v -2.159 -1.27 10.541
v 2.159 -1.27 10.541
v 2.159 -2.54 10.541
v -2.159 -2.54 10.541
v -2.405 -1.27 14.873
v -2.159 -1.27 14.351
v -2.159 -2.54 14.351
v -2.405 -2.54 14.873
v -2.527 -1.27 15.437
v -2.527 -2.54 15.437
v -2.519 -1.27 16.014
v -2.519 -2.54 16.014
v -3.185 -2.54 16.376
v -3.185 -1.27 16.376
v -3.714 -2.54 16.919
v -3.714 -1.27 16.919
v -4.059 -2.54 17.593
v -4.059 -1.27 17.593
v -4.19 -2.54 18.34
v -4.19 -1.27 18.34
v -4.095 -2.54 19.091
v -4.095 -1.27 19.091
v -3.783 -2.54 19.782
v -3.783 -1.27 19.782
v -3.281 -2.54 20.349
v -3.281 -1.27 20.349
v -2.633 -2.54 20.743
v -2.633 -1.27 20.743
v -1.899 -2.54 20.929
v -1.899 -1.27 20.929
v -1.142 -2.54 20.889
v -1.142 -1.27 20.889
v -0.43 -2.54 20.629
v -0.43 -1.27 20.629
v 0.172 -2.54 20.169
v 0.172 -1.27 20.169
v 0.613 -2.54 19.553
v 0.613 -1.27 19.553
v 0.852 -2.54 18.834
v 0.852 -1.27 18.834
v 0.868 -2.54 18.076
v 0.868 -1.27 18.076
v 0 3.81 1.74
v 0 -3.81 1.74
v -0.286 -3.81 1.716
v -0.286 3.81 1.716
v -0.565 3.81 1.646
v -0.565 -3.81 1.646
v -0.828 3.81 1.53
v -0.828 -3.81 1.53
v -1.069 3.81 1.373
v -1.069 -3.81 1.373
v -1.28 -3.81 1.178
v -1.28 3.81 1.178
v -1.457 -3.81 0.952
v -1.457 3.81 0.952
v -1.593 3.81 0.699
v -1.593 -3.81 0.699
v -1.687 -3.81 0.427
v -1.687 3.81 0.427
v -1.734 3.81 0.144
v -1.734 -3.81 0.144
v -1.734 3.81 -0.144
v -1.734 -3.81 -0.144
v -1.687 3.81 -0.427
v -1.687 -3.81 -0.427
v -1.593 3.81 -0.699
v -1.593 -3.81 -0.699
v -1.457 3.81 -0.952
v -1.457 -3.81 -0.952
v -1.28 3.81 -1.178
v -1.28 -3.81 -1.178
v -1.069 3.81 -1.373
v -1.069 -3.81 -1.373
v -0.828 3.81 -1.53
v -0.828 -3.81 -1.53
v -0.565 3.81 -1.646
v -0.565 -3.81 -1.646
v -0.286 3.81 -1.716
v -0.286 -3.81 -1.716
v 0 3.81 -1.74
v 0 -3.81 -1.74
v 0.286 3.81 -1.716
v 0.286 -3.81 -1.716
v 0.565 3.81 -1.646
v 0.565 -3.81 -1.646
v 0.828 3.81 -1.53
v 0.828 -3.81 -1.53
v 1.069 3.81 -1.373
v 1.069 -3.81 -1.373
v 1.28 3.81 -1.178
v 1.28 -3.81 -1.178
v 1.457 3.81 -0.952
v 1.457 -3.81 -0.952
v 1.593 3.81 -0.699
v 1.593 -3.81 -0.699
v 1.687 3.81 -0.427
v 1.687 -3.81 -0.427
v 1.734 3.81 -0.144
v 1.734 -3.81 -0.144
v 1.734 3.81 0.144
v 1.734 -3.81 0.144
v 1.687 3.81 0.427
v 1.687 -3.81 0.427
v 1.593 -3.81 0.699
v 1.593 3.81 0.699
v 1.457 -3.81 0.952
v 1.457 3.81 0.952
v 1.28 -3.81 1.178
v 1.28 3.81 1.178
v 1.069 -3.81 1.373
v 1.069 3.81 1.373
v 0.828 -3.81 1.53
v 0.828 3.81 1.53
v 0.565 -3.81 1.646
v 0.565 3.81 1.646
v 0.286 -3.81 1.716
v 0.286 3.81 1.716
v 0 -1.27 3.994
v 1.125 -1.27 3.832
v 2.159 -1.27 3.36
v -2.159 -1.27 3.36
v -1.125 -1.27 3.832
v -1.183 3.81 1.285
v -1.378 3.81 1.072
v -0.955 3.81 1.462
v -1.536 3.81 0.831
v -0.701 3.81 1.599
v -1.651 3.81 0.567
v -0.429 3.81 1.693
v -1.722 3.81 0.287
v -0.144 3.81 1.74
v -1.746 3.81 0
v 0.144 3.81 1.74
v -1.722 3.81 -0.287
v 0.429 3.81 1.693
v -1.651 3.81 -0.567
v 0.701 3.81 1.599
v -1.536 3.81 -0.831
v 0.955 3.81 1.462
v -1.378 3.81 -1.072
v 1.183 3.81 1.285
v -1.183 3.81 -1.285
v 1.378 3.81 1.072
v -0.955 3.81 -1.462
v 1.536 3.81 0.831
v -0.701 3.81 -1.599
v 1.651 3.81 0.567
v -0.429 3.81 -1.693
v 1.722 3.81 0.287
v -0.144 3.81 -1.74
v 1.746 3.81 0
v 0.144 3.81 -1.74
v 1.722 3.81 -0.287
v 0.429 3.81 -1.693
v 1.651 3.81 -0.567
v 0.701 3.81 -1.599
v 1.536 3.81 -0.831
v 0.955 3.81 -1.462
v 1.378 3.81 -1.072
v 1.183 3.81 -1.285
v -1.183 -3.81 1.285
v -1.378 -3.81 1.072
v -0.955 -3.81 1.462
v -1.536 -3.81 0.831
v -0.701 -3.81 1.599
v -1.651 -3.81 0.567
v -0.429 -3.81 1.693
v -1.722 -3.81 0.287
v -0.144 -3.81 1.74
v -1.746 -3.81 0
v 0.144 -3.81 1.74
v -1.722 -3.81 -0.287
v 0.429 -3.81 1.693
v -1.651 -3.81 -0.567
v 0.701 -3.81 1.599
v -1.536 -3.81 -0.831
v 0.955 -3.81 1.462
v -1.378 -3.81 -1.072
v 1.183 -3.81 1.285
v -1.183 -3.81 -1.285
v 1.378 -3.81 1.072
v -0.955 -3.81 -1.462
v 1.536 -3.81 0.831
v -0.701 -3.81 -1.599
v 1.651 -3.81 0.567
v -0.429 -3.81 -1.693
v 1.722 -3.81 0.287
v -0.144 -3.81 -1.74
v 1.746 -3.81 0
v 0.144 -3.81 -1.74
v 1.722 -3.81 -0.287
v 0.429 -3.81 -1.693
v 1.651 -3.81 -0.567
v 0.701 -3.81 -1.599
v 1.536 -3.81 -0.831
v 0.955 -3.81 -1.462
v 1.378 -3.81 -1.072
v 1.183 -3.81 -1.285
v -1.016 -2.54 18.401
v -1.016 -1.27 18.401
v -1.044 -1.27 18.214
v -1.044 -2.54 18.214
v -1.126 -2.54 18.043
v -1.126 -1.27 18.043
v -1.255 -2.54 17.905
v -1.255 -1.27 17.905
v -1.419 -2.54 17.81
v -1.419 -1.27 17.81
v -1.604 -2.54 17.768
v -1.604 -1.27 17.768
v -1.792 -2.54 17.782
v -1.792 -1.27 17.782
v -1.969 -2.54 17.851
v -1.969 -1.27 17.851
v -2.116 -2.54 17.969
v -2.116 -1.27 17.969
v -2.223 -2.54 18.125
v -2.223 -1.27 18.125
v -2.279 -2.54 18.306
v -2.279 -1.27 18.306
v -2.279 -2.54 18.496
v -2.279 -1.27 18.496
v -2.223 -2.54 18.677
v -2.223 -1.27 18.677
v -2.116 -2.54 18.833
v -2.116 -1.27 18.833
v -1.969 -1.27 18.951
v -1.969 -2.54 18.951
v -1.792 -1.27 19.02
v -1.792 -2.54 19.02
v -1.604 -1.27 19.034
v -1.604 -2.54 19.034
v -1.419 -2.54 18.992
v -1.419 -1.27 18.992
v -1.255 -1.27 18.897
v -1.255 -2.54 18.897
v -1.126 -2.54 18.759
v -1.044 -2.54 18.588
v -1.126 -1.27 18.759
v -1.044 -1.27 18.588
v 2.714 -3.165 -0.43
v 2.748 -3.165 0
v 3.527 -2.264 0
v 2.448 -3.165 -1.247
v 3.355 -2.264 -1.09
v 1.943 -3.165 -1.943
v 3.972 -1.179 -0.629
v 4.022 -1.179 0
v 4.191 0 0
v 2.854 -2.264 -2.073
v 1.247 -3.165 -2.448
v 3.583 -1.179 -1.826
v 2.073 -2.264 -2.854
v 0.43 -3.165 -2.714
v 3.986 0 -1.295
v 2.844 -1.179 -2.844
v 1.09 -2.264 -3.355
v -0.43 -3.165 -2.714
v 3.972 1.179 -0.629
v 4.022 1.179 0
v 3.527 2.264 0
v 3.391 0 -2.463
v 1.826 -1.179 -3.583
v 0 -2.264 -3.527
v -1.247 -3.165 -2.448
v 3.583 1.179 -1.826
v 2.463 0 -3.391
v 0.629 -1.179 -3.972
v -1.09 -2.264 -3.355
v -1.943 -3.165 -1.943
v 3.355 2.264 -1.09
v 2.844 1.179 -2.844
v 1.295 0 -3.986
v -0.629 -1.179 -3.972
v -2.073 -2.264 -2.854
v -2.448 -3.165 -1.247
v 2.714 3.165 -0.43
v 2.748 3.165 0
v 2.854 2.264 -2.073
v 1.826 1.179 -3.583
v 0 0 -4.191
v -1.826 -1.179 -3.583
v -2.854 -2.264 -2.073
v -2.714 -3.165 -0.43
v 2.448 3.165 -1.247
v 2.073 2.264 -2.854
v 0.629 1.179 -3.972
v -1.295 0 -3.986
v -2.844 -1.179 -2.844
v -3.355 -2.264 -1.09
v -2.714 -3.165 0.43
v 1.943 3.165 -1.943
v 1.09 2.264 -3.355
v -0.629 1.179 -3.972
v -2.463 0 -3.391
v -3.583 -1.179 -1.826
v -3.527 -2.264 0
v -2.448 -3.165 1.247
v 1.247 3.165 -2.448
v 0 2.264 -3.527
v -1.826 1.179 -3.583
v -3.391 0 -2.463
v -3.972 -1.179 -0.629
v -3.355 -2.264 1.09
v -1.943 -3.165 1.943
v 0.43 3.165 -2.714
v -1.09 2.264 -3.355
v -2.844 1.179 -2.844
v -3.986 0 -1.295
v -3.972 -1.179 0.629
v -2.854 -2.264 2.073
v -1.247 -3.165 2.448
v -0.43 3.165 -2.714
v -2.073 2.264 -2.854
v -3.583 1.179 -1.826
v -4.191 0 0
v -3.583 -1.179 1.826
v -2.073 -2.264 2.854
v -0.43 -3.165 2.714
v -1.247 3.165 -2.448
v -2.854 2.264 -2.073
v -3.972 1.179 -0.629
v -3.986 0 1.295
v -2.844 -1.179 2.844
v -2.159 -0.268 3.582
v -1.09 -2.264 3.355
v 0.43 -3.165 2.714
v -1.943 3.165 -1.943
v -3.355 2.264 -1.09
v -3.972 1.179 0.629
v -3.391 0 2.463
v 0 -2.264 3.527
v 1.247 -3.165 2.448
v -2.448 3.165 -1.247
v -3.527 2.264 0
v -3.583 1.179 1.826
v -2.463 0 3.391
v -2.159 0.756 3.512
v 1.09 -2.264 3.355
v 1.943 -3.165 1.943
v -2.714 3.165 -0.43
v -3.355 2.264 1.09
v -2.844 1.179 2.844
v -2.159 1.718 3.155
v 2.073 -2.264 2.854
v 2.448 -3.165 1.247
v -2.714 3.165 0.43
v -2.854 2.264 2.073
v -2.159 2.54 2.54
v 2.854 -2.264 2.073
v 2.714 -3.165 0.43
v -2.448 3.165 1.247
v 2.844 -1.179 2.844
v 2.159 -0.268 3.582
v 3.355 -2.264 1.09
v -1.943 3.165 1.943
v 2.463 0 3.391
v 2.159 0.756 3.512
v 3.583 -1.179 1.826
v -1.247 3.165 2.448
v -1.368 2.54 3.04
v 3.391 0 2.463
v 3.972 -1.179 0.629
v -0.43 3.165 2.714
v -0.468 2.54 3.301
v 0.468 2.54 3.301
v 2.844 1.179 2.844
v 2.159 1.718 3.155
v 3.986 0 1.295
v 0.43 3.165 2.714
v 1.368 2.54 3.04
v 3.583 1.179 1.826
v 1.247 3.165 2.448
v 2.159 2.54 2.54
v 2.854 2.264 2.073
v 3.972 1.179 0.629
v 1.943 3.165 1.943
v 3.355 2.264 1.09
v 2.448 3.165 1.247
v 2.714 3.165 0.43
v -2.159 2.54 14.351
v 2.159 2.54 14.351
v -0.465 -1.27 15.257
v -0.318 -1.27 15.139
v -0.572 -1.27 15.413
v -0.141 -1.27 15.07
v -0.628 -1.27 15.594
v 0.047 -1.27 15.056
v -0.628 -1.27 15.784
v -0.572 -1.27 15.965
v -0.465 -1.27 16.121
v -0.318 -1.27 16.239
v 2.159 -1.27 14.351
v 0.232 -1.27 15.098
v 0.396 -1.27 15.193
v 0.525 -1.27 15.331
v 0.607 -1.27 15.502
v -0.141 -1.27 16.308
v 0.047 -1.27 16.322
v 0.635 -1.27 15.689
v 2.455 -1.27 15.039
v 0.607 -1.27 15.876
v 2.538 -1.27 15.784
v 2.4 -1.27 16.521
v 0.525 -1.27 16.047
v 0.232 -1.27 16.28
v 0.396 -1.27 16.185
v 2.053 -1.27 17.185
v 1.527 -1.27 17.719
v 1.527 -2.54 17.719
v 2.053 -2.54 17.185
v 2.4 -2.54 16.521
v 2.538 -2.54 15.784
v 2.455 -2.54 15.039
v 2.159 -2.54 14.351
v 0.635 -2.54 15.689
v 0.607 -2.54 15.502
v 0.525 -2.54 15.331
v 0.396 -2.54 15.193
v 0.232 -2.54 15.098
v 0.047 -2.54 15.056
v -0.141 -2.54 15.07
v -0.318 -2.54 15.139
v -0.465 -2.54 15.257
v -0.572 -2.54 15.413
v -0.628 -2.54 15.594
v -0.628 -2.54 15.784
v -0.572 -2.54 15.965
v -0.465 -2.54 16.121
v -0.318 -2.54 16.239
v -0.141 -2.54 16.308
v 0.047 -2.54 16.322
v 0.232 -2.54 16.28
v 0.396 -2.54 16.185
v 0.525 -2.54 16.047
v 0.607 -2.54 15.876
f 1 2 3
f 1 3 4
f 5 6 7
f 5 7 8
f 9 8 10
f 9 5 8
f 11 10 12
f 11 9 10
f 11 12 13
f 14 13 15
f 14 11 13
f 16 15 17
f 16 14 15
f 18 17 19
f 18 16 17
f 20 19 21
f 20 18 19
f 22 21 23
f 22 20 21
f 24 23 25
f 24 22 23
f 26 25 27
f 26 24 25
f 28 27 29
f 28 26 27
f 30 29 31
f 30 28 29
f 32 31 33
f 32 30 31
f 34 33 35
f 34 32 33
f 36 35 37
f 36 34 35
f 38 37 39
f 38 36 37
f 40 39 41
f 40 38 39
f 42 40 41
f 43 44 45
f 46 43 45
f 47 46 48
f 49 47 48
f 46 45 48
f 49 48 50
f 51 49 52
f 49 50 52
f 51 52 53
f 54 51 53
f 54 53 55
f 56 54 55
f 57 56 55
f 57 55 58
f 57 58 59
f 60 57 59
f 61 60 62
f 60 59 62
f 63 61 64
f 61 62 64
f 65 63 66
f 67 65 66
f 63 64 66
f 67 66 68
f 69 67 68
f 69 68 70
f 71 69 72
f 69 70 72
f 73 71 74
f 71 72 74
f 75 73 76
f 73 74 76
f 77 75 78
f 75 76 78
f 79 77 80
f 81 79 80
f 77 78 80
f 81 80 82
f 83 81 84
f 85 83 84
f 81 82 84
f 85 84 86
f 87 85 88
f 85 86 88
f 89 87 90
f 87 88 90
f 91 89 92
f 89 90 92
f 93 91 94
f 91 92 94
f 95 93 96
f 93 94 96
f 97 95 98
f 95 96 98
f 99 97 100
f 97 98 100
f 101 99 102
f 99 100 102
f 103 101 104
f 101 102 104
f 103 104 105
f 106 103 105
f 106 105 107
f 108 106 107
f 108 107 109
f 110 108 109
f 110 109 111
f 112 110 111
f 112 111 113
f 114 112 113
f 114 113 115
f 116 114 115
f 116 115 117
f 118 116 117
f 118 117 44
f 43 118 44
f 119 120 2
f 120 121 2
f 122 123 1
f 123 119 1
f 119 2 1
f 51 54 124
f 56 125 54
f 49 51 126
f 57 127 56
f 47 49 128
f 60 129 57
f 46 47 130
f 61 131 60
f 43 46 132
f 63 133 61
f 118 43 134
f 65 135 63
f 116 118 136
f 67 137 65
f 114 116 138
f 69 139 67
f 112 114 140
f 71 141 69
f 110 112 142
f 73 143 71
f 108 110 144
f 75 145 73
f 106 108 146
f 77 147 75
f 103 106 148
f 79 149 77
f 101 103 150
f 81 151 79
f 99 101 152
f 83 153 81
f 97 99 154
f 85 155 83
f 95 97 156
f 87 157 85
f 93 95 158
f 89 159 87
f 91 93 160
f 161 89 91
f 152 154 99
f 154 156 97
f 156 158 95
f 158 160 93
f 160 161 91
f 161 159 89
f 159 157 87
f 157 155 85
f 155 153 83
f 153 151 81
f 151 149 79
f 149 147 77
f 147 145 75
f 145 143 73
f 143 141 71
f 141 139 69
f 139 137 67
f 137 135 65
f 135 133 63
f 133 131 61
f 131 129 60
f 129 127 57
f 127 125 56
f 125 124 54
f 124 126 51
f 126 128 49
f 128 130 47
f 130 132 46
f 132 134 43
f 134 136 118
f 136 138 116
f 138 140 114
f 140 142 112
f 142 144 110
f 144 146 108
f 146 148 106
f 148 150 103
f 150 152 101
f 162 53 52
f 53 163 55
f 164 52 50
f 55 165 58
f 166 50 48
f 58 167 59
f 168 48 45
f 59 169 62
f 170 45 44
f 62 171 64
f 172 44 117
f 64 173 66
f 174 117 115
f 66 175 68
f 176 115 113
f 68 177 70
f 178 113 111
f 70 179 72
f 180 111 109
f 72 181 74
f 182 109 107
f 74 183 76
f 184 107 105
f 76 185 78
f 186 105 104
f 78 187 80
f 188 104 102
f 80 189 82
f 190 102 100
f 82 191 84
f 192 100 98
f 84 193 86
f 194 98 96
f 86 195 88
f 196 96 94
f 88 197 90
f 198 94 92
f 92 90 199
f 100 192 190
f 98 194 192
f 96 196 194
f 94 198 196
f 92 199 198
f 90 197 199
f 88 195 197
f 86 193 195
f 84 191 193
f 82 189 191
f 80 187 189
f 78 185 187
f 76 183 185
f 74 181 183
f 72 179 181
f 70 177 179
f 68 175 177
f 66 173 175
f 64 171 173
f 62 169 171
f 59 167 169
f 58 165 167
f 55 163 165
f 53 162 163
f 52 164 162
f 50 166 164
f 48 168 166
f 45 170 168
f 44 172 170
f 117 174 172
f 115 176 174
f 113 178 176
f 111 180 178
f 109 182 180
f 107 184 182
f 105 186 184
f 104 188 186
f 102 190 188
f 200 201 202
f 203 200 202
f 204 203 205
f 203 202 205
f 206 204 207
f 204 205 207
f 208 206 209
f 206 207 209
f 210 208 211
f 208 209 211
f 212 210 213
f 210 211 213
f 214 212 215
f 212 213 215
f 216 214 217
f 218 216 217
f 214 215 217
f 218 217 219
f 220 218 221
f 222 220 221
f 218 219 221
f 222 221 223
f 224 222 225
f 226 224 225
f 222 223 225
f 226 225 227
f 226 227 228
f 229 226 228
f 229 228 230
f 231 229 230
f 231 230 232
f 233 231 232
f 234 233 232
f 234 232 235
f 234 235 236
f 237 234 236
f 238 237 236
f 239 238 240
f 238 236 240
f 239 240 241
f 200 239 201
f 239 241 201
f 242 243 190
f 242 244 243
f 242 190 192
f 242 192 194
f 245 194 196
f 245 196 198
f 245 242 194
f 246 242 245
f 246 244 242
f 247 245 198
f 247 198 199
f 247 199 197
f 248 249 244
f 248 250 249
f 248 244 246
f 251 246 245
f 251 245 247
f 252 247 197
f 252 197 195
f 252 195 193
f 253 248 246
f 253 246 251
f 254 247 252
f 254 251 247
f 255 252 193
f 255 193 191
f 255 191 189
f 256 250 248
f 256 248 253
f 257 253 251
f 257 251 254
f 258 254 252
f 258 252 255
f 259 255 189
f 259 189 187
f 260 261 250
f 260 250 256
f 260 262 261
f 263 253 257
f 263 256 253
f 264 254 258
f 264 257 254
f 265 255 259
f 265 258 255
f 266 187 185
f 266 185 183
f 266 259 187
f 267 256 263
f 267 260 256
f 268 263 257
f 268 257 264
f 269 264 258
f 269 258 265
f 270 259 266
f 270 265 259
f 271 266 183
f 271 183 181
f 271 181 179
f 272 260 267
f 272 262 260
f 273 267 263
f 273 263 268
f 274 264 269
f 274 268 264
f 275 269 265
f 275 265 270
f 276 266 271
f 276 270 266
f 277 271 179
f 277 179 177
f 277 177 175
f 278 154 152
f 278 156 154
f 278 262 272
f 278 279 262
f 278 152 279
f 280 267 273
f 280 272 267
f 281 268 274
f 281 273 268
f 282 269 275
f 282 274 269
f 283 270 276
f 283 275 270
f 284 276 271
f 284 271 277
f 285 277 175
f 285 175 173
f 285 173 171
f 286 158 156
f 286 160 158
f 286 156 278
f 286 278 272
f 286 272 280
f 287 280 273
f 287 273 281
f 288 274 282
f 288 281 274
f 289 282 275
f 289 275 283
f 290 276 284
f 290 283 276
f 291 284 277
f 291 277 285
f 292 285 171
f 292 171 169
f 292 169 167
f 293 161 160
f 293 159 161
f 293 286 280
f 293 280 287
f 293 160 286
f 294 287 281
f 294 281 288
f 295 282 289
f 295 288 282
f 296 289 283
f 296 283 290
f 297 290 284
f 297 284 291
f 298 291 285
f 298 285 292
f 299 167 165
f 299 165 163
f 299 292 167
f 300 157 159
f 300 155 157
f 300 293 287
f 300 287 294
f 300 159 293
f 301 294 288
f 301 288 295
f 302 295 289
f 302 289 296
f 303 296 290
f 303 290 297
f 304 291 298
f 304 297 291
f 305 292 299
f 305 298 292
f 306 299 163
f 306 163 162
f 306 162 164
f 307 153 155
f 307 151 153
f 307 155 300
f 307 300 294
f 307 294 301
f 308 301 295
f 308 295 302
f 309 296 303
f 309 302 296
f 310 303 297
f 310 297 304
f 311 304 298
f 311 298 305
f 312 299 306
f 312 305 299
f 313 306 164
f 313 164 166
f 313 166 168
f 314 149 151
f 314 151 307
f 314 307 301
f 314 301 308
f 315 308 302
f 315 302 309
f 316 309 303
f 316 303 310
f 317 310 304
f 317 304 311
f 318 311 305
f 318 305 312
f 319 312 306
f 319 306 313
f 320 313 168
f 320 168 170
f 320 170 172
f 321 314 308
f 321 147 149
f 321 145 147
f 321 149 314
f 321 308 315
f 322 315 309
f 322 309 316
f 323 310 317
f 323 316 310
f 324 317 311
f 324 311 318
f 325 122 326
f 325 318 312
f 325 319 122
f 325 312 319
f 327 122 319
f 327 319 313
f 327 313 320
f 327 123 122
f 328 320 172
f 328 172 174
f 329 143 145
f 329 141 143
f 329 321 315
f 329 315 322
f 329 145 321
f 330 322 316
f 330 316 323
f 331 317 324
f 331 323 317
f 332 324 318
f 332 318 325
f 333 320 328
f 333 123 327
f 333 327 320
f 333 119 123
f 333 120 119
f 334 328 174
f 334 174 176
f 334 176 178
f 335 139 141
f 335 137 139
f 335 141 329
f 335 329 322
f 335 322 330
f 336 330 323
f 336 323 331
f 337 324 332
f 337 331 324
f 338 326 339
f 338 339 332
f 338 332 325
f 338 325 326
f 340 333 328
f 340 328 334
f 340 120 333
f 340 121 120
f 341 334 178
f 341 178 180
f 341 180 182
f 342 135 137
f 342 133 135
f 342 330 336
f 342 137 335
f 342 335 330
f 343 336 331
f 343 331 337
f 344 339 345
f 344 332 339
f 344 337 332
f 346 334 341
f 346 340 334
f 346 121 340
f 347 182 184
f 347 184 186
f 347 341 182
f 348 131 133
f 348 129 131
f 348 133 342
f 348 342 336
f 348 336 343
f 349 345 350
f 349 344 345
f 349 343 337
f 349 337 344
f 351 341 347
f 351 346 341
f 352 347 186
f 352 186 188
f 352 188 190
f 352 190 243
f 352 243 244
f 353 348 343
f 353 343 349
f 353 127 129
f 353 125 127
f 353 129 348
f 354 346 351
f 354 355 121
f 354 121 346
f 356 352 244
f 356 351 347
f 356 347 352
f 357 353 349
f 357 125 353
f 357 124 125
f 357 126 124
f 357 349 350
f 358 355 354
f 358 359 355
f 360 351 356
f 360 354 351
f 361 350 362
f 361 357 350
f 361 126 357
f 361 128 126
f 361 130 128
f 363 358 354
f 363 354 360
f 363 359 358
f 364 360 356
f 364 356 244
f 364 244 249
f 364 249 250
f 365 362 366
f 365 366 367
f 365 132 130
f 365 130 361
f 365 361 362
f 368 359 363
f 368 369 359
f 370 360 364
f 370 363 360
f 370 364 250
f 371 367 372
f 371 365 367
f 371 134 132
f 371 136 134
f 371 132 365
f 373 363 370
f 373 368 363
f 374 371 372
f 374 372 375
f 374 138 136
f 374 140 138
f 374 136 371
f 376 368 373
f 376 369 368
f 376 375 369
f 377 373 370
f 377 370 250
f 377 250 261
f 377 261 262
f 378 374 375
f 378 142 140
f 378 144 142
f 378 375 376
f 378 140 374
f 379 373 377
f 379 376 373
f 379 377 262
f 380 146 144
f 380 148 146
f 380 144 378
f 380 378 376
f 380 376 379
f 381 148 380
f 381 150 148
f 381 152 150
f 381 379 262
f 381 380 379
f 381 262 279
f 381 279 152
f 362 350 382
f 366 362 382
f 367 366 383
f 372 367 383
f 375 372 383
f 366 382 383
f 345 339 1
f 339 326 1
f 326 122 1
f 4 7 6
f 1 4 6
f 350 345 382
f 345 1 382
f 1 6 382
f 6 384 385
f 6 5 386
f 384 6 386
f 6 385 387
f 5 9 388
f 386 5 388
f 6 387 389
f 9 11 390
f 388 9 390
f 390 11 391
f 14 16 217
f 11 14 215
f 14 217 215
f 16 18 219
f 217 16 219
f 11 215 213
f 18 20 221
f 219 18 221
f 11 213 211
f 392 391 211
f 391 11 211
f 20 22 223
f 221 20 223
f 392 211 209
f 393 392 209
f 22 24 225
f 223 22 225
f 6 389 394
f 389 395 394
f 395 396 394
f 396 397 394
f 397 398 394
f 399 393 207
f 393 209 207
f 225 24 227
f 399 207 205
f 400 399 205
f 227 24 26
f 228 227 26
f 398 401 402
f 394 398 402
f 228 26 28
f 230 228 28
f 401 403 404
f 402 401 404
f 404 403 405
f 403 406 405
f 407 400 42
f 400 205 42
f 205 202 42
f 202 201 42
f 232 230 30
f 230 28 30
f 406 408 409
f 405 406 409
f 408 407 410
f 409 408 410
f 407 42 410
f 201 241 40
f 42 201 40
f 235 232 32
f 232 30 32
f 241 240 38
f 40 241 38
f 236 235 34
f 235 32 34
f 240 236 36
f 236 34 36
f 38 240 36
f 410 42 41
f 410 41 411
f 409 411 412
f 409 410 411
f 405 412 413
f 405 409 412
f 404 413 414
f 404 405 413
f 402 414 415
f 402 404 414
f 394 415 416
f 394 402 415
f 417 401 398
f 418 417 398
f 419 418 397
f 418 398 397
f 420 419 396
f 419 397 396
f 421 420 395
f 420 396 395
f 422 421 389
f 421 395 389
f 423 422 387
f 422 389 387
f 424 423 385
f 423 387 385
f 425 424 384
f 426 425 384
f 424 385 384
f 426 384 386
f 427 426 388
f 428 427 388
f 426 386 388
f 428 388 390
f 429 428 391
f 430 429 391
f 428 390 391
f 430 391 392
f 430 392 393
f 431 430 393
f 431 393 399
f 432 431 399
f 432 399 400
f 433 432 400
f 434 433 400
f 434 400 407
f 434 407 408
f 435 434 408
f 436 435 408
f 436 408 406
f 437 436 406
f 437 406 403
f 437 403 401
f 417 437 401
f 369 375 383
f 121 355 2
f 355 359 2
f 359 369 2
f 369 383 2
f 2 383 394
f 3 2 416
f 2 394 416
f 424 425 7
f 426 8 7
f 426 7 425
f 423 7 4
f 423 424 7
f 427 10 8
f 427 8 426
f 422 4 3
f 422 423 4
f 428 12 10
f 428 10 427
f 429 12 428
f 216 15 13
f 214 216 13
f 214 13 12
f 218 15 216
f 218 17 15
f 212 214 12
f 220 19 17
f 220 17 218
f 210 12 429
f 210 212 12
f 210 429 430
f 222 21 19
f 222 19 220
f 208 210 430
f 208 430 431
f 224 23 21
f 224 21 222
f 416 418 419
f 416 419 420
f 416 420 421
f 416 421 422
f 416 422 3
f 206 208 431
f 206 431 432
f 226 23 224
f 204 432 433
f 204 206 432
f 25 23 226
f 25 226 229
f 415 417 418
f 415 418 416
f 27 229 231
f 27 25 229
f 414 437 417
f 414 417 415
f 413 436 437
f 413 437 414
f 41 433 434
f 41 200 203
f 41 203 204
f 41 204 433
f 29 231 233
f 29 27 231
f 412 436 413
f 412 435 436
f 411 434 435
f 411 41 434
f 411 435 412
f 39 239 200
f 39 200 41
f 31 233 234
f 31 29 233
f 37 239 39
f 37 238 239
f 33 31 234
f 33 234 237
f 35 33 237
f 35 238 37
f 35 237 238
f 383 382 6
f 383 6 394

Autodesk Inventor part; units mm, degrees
ref_plane "YZ Plane" through (0, 0, 0) normal (1, 0, 0) x (0, 1, 0)
ref_plane "XZ Plane" through (0, 0, 0) normal (0, 1, 0) x (-1, 0, 0)
sketch "Sketch1" plane through (0, 0, 0) normal (0, 0, 1) x (1, 0, 0)
  line L0 (0, 3.81) -> (1.746, 3.81)
  line L1 (0, 0) -> (0, 7.4896) construction
  line L2 (0, 0) -> (13.1944, 0) construction
  line L3 (0, -3.81) -> (1.746, -3.81)
  arc A0 (1.746, -3.81) -> (1.746, 3.81) centre (0, 0) ccw
  line L4 (0, 3.81) -> (0, -3.81)
  point P0 (-6.8886, 3.81)
  point P1 (6.6767, 3.81)
  point P2 (0, 4.191)
  point P3 (0, 4.191)
  point P4 (-6.8886, -3.81)
  point P5 (6.6767, -3.81)
  point P6 (0, 4.191)
  point P7 (4.191, 0)
  dimension "d1" = 0.381
  dimension "d11" = 4.191
revolve "Revolution1" add sketch "Sketch1" angle 360 about axis through (0, 0, 0) along (0, 1, 0)
sketch "Sketch2" plane through (0, 3.81, 0) normal (0, 1, 0) x (1, 0, 0)
  circle A0 centre (0, 0) radius 1.746 projected
  dimension "d3" = 3.4919
hole "Hole1" at (0, 3.81, 0) direction (0, -1, 0) diameter 3.4798 end through all
ref_plane "Work Plane1" through (0, 0, 4.191) normal (0, 0, 1) x (1, 0, 0)
sketch "Sketch3" plane through (0, 0, 4.191) normal (0, 0, 1) x (1, 0, 0)
  line L0 (-2.159, 2.54) -> (2.159, 2.54)
  line L1 (2.159, 2.54) -> (2.159, -1.27)
  line L2 (2.159, -1.27) -> (-2.159, -1.27)
  line L3 (-2.159, -1.27) -> (-2.159, 2.54)
  line L4 (1.746, 3.81) -> (-1.746, 3.81) projected
  point P0 (0, 0)
  point P1 (0, 2.54)
  dimension "d13" = 4.318
  dimension "d14" = 3.81
  dimension "d15" = 1.27
extrude "Extrusion1" add sketch "Sketch3" along normal blind 10.16
ref_plane "Work Plane2" through (0, 0, 1.7399) normal (0, 0, 1) x (1, 0, 0)
extrude "Extrusion2" add sketch "Sketch3" against normal up to surface (2.4511 mm away)
sketch "Sketch4" plane through (0, -1.27, 0) normal (0, -1, 0) x (1, 0, 0)
  line L0 (2.159, 2.54) -> (2.159, 14.351) projected
  line L1 (2.159, 10.541) -> (-2.159, 10.541)
  line L2 (-2.159, 10.541) -> (-2.159, 14.351)
  line L3 (-2.159, 14.351) -> (2.159, 14.351)
  line L4 (2.159, 14.351) -> (2.159, 10.541) construction
  line L5 (-2.159, 14.351) -> (2.159, 14.351) projected
  circle A0 centre (0, 15.689) radius 0.635
  circle A1 centre (0, 15.689) radius 2.54
  circle A2 centre (-1.651, 18.401) radius 0.635
  circle A3 centre (-1.651, 18.401) radius 2.54
  point P0 (0, 0)
  point P1 (2.159, 14.351)
  point P2 (0, 14.351)
  point P3 (2.159, 14.351)
  point P4 (0.889, 18.401)
  point P5 (-2.5191, 16.014)
  point P6 (-1.3208, 17.8586)
  point P7 (0.8681, 18.0761)
  dimension "d31" = 5.08
  dimension "d22" = 3.81
  dimension "d25" = 1.27
  dimension "d27" = 5.08
  dimension "d30" = 1.27
  dimension "d32" = 1.27
  dimension "d33" = 4.318
extrude "Extrusion4" add sketch "Sketch4" along normal blind 1.27
properties part number "Left Arm" material "Phenolic Resin"
